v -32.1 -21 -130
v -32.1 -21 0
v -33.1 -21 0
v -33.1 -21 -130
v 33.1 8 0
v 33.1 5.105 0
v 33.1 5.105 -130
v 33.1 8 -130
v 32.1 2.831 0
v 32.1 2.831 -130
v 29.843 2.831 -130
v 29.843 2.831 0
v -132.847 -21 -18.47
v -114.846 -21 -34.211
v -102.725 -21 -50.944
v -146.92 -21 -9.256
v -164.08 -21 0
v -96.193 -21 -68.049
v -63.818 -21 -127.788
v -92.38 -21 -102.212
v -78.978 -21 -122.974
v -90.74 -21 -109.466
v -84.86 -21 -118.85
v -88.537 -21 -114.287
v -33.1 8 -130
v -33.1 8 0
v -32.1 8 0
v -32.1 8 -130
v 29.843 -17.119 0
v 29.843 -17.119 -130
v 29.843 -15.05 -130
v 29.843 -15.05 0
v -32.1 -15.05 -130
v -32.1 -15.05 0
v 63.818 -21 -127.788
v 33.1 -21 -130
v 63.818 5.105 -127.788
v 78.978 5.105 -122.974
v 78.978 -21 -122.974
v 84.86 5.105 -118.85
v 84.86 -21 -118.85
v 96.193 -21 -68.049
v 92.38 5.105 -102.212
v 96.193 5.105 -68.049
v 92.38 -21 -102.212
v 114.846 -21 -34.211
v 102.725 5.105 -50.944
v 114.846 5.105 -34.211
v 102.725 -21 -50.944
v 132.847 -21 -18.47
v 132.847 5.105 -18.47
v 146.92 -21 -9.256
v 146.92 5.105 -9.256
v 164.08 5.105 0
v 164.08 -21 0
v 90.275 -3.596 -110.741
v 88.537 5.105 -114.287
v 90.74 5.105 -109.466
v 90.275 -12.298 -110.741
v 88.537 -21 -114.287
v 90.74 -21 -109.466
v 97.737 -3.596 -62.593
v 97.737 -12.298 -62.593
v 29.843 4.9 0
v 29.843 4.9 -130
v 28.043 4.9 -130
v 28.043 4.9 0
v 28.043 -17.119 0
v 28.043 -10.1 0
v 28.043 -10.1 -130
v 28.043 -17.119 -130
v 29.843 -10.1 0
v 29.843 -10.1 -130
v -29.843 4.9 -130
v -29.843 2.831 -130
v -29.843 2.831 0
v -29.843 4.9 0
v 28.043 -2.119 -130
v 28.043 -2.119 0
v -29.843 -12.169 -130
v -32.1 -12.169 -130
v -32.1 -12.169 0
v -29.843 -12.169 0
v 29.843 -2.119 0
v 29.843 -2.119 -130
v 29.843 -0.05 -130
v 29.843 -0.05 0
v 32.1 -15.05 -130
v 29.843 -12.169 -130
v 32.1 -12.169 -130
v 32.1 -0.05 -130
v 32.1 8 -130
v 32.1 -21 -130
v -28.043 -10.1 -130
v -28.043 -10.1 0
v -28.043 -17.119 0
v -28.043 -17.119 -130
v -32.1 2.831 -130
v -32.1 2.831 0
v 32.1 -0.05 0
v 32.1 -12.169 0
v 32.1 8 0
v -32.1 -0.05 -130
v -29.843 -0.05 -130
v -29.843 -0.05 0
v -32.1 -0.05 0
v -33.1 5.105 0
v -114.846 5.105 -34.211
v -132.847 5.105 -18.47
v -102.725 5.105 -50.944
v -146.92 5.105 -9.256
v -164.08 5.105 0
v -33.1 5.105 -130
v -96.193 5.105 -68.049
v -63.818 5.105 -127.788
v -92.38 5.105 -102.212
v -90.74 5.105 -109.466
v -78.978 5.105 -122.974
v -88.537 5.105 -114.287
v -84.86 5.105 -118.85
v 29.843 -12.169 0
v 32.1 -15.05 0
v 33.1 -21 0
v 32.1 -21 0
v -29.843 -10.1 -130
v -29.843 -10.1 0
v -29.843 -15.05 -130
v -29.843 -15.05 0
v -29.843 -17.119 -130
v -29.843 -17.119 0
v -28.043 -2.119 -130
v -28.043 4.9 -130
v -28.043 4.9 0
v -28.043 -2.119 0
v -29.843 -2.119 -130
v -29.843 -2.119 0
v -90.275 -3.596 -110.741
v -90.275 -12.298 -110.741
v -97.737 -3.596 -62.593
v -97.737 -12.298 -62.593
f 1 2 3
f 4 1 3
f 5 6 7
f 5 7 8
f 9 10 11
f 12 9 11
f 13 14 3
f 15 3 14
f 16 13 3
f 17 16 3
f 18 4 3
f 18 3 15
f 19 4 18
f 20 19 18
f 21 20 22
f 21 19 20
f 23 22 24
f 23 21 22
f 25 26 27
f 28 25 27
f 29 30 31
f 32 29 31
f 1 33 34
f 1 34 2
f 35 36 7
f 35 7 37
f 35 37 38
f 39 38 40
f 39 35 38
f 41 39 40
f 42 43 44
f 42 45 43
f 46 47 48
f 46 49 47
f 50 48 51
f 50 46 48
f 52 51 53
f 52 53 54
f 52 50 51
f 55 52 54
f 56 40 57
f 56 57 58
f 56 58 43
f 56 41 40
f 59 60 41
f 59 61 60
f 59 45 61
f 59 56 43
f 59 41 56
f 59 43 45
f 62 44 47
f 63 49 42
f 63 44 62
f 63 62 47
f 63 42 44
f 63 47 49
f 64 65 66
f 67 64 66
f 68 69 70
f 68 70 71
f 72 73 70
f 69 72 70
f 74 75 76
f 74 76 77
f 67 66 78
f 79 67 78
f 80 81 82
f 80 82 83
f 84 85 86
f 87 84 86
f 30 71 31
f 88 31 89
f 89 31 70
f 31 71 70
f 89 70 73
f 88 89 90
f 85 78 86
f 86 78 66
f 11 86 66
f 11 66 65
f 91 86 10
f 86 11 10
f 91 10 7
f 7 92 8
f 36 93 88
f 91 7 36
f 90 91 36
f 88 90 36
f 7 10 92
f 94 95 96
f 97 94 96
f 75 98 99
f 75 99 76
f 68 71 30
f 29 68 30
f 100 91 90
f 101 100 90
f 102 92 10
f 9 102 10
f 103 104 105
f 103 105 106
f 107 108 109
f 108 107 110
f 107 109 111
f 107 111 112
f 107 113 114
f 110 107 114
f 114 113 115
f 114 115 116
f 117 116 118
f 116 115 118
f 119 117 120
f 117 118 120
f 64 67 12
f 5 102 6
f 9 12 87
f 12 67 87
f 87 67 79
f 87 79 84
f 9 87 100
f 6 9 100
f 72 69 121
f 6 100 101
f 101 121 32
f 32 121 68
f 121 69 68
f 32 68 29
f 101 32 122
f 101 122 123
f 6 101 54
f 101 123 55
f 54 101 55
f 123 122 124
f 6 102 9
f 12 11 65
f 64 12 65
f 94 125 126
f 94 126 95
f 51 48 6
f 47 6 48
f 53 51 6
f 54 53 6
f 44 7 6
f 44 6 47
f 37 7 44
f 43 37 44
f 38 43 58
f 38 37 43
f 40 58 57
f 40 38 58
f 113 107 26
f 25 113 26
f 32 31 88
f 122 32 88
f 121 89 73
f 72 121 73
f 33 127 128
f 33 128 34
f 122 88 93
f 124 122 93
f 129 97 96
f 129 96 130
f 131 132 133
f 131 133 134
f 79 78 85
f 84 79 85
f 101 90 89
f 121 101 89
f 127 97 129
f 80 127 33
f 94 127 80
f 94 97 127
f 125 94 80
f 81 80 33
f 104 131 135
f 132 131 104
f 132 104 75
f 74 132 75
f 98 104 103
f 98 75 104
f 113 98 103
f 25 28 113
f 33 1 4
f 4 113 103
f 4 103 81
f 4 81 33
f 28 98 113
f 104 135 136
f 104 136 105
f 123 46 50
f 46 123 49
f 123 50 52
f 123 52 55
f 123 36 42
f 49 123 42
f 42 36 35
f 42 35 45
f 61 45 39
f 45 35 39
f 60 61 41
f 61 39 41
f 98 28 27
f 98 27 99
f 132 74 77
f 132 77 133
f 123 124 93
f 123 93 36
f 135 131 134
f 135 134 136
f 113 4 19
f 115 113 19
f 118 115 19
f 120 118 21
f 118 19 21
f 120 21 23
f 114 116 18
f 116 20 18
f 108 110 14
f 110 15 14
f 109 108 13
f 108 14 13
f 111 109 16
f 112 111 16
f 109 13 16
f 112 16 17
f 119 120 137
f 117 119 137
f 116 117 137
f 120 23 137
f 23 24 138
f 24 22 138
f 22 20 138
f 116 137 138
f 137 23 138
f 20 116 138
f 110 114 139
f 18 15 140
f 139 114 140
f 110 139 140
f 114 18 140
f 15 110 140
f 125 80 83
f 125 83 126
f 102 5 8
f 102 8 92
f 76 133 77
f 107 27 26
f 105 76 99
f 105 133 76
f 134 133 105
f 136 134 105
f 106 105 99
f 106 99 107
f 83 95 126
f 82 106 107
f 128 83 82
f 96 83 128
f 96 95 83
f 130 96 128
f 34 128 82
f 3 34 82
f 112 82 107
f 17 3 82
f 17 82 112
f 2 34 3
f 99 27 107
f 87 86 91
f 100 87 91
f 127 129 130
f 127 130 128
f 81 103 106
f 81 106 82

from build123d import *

# Parameters (mm, degrees)
BOSS_EXTRUDE1_DEPTH      = 130
BOSS_EXTRUDE2_DEPTH      = 6
BOSS_EXTRUDE2_DEPTH_BACK = 20.105473


with BuildPart() as part:
    # Sketch1 → Boss-Extrude1 (new body)
    with BuildSketch(Plane.XY.offset(-130)):
        Polygon((-32.1, -15.049651452), (-32.1, -21), (-33.1, -21), (-33.1, 8), (-32.1, 8), (-32.1, 2.830782278), (-29.842797906, 2.830782278), (-29.842797906, 4.9), (-28.042797906, 4.9), (-28.042797906, -2.118869174), (-29.842797906, -2.118869174), (-29.842797906, -0.049651452), (-32.1, -0.049651452), (-32.1, -12.169217722), (-29.842797906, -12.169217722), (-29.842797906, -10.1), (-28.042797906, -10.1), (-28.042797906, -17.118869174), (-29.842797906, -17.118869174), (-29.842797906, -15.049651452), align=None)
    extrude(amount=BOSS_EXTRUDE1_DEPTH)

    # Sketch2 → Boss-Extrude2 (add, two sides: drawn at the far end of the back side and taken through both)
    with BuildSketch(Plane(origin=(75.296860797, -0.894527219, -218.700782843), x_dir=(1, 0, 0), z_dir=(0, 1, 0)).offset(-BOSS_EXTRUDE2_DEPTH_BACK)):
        with BuildLine():
            Line((-108.396860797, -88.700782843), (-108.396860797, -218.700782843))
            Line((-108.396860797, -218.700782843), (-239.376748065, -218.700782843))
            add(Edge.make_bspline(
                [(-108.396860797, -88.700782843), (-226.624669083, -88.700782843), (-107.396860797, -153.700782843), (-239.376748065, -218.700782843)],
                knots=[0, 0, 0, 0, 1, 1, 1, 1], degree=3))
        make_face()
    extrude(amount=BOSS_EXTRUDE2_DEPTH + BOSS_EXTRUDE2_DEPTH_BACK)


with BuildPart() as body_2:
    # Mirror1: mirrored copy
    add(part.part.mirror(Plane(origin=(0, 0, 0), x_dir=(0, 0, 1), z_dir=(1, 0, 0))))


solid = Compound([part.part, body_2.part])
